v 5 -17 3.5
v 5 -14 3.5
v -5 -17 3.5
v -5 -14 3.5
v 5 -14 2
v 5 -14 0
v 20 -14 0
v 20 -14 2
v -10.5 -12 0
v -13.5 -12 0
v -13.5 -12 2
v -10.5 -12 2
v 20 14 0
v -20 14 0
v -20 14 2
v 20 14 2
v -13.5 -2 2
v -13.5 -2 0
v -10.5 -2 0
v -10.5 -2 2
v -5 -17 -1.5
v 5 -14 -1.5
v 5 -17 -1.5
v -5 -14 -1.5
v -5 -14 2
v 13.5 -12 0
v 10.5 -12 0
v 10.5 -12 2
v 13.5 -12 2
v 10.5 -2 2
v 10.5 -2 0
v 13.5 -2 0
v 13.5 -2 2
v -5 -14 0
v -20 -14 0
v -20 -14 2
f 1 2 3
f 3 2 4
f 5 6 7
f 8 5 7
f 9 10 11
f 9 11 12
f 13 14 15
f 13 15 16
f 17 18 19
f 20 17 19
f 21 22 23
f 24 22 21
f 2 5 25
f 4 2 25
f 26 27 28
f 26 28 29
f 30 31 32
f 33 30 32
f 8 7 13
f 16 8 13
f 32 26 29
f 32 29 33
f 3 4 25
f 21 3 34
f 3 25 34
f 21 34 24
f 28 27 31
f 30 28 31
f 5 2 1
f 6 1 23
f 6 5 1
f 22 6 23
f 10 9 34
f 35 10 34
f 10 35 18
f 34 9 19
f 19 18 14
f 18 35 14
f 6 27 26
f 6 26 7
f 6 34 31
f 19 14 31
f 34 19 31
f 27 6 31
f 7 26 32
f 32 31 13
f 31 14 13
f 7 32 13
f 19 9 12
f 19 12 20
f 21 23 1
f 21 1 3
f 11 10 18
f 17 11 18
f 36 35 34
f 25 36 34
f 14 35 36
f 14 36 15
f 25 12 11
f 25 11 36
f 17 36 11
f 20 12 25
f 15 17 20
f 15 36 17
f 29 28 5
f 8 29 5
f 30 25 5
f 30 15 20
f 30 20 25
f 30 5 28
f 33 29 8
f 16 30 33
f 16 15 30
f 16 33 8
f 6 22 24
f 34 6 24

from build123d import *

# Parameters (mm, degrees)
SKETCH1_W               = 40
SKETCH1_H               = 28
BOSS_EXTRUDE1_DEPTH     = 2
CUT_EXTRUDE1_DEPTH      = 25.494897428
CUT_EXTRUDE1_DEPTH_BACK = 25.494897428
SKETCH2_W               = 3
SKETCH2_H               = 10
SKETCH5_W               = 10
SKETCH5_H               = 5
BOSS_EXTRUDE2_DEPTH     = 3


with BuildPart() as part:
    # Sketch1 → Boss-Extrude1 (new body)
    with BuildSketch(Plane.XY):
        Rectangle(SKETCH1_W, SKETCH1_H)
    extrude(amount=BOSS_EXTRUDE1_DEPTH)

    # Sketch2 → Cut-Extrude1 (cut, two sides: drawn at the far end of the back side and taken through both)
    with BuildSketch(Plane.XY.offset(2).offset(-CUT_EXTRUDE1_DEPTH_BACK)):
        with Locations((-12, -7)):
            Rectangle(SKETCH2_W, SKETCH2_H)
        with Locations((12, -7)):
            Rectangle(SKETCH2_W, SKETCH2_H)
    extrude(amount=CUT_EXTRUDE1_DEPTH + CUT_EXTRUDE1_DEPTH_BACK, mode=Mode.SUBTRACT)

    # Sketch5 → Boss-Extrude2 (add)
    with BuildSketch(Plane(origin=(0, -14, 0), x_dir=(-1, 0, 0), z_dir=(0, -1, 0))):
        with Locations((0, -1)):
            Rectangle(SKETCH5_W, SKETCH5_H)
    extrude(amount=BOSS_EXTRUDE2_DEPTH)


solid = part.part
